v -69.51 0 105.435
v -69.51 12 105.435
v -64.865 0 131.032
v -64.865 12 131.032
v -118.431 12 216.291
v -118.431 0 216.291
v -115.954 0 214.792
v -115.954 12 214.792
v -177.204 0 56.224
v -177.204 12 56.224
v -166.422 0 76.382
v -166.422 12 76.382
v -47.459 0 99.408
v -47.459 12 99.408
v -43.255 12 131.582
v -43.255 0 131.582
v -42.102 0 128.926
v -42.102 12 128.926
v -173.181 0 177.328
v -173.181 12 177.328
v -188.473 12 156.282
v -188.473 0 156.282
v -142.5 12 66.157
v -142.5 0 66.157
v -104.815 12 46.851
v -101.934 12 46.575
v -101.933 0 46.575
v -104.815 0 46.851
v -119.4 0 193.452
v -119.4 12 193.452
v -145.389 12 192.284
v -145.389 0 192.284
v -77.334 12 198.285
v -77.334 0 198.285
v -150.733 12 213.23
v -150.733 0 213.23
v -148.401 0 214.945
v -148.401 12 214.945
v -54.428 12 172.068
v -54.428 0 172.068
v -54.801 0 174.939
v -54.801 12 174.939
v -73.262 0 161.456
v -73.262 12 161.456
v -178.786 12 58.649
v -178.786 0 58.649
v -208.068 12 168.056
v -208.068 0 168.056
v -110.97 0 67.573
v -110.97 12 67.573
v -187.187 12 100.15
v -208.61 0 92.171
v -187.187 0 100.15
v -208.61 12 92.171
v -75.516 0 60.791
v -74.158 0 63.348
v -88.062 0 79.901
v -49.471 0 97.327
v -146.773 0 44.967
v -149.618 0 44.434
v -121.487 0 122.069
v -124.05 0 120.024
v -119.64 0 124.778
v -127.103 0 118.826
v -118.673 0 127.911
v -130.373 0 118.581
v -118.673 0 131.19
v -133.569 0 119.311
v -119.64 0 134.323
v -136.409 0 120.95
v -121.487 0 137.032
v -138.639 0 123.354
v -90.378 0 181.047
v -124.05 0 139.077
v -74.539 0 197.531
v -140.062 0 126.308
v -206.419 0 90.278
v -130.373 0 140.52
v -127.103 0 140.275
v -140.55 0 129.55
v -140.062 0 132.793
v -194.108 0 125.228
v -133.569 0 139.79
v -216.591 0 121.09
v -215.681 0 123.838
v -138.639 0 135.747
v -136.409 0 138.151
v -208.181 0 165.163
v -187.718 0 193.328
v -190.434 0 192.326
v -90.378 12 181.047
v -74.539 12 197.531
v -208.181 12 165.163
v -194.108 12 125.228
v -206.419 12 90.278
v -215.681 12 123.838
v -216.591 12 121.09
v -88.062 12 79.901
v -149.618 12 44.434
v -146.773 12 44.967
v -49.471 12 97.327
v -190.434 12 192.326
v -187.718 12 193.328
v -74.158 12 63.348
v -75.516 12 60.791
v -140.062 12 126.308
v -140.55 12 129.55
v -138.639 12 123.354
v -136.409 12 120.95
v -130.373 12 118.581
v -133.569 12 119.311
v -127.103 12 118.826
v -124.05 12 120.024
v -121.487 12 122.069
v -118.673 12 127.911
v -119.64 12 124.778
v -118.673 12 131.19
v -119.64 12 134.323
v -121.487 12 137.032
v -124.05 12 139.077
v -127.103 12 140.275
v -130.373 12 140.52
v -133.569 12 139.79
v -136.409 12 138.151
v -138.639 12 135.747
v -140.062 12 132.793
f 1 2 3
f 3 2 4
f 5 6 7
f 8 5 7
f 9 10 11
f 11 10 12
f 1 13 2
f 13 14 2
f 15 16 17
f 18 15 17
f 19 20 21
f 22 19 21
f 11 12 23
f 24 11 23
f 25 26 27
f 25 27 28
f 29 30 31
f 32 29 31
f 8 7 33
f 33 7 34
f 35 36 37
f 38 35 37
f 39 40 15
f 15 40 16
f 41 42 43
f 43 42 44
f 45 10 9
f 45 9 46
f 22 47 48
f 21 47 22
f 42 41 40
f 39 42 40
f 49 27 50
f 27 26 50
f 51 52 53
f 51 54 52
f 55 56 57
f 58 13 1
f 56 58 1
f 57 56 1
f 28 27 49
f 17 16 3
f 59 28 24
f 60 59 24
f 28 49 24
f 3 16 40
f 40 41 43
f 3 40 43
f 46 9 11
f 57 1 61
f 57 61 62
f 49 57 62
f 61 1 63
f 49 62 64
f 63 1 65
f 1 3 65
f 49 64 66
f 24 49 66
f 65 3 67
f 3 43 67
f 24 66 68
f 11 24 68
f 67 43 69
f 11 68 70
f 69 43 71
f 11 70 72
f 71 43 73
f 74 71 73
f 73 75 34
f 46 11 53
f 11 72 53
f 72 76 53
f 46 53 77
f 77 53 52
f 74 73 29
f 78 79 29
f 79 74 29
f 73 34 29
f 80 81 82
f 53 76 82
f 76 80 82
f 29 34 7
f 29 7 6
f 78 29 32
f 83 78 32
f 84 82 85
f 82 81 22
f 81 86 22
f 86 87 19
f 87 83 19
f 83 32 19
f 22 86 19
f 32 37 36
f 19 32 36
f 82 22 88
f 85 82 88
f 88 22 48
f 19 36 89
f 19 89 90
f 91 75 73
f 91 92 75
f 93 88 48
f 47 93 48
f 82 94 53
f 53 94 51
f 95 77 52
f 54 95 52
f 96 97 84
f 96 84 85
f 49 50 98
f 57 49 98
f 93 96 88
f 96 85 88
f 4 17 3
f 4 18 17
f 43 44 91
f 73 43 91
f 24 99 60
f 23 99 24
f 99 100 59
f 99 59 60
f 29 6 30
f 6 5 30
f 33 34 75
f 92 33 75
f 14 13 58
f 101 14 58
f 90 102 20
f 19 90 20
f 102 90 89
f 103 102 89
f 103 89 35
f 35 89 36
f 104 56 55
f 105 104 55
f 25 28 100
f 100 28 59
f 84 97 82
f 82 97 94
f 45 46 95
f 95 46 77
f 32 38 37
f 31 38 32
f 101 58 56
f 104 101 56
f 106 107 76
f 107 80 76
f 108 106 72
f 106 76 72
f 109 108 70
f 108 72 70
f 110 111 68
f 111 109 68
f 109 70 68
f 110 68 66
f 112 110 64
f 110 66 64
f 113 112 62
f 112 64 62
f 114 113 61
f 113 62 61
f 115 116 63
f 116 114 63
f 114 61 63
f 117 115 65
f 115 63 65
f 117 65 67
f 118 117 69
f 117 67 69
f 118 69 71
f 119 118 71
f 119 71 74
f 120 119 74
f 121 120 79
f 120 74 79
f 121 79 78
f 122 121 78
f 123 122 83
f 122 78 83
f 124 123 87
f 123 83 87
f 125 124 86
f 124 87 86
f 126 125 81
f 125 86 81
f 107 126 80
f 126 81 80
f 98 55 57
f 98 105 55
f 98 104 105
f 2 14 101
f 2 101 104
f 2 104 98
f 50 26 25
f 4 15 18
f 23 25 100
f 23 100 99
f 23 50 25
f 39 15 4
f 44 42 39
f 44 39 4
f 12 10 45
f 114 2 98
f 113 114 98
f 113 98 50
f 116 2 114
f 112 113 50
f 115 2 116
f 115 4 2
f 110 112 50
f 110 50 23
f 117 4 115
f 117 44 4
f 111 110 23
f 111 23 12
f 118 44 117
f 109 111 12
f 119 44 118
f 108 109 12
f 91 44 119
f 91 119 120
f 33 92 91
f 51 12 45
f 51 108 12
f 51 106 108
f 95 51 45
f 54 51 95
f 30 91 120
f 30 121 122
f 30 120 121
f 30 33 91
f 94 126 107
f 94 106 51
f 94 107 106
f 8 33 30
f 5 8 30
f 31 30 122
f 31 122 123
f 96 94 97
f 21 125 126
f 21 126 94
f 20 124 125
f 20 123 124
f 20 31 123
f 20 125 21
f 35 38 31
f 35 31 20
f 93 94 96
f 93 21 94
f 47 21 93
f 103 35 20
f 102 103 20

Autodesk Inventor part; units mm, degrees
ref_plane "YZ Plane" through (0, 0, 0) normal (1, 0, 0) x (0, 1, 0)
ref_plane "XZ Plane" through (0, 0, 0) normal (0, 1, 0) x (-1, 0, 0)
ref_plane "XY Plane" through (0, 0, 0) normal (0, 0, 1) x (1, 0, 0)
sketch "Sketch2" plane through (0, 0, 0) normal (0, 1, 0) x (-1, 0, 0)
  line L0 (77.8598, 129.5505) -> (181.2412, 129.5505)
  line L1 (129.5505, 77.8598) -> (129.5505, 181.2412)
  line L2 (208.1814, 165.1629) -> (207.9893, 170.0518)
  line L3 (207.9893, 170.0518) -> (209.1581, 174.8028)
  line L4 (209.1581, 174.8028) -> (211.5965, 179.0445)
  line L5 (211.5965, 179.0445) -> (215.1139, 182.4454)
  line L6 (215.1139, 182.4454) -> (217.4859, 184.4007)
  line L7 (217.4859, 184.4007) -> (218.8706, 185.7147)
  line L8 (218.8706, 185.7147) -> (219.868, 187.3423)
  line L9 (219.868, 187.3423) -> (220.4102, 189.1727)
  line L10 (220.4102, 189.1727) -> (220.4602, 191.0809)
  line L11 (220.4602, 191.0809) -> (220.0145, 192.9371)
  line L12 (220.0145, 192.9371) -> (219.1037, 194.6147)
  line L13 (219.1037, 194.6147) -> (217.7897, 195.9994)
  line L14 (217.7897, 195.9994) -> (216.162, 196.9968)
  line L15 (216.162, 196.9968) -> (214.3317, 197.5389)
  line L16 (214.3317, 197.5389) -> (212.4235, 197.5889)
  line L17 (212.4235, 197.5889) -> (210.5673, 197.1433)
  line L18 (210.5673, 197.1433) -> (208.8897, 196.2324)
  line L19 (208.8897, 196.2324) -> (206.2971, 194.5807)
  line L20 (206.2971, 194.5807) -> (201.9757, 192.2864)
  line L21 (201.9757, 192.2864) -> (197.1881, 191.2781)
  line L22 (197.1881, 191.2781) -> (192.3084, 191.6346)
  line L23 (192.3084, 191.6346) -> (187.7182, 193.3281)
  line L24 (187.7182, 193.3281) -> (150.7331, 213.2305)
  line L25 (150.7331, 213.2305) -> (146.7911, 216.1285)
  line L26 (146.7911, 216.1285) -> (143.8054, 220.0046)
  line L27 (143.8054, 220.0046) -> (142.0094, 224.5557)
  line L28 (142.0094, 224.5557) -> (141.5435, 229.4261)
  line L29 (141.5435, 229.4261) -> (141.4937, 232.4997)
  line L30 (141.4937, 232.4997) -> (141.3297, 234.4016)
  line L31 (141.3297, 234.4016) -> (140.6791, 236.1962)
  line L32 (140.6791, 236.1962) -> (139.5861, 237.7613)
  line L33 (139.5861, 237.7613) -> (138.1253, 238.9901)
  line L34 (138.1253, 238.9901) -> (136.3963, 239.799)
  line L35 (136.3963, 239.799) -> (134.5168, 240.1329)
  line L36 (134.5168, 240.1329) -> (132.6149, 239.9689)
  line L37 (132.6149, 239.9689) -> (130.8203, 239.3182)
  line L38 (130.8203, 239.3182) -> (129.2552, 238.2252)
  line L39 (129.2552, 238.2252) -> (128.0264, 236.7645)
  line L40 (128.0264, 236.7645) -> (127.2175, 235.0354)
  line L41 (127.2175, 235.0354) -> (126.8836, 233.1559)
  line L42 (126.8836, 233.1559) -> (126.5586, 230.0991)
  line L43 (126.5586, 230.0991) -> (125.658, 225.29)
  line L44 (125.658, 225.29) -> (123.4612, 220.9182)
  line L45 (123.4612, 220.9182) -> (120.1401, 217.3254)
  line L46 (120.1401, 217.3254) -> (115.9541, 214.7925)
  line L47 (115.9541, 214.7925) -> (77.334, 198.2854)
  line L48 (77.334, 198.2854) -> (72.6104, 197.0103)
  line L49 (72.6104, 197.0103) -> (67.7184, 197.0926)
  line L50 (67.7184, 197.0926) -> (63.0404, 198.526)
  line L51 (63.0404, 198.526) -> (58.9421, 201.1984)
  line L52 (58.9421, 201.1984) -> (56.508, 203.0759)
  line L53 (56.508, 203.0759) -> (54.9188, 204.1335)
  line L54 (54.9188, 204.1335) -> (53.1101, 204.7437)
  line L55 (53.1101, 204.7437) -> (51.205, 204.865)
  line L56 (51.205, 204.865) -> (49.3334, 204.4891)
  line L57 (49.3334, 204.4891) -> (47.623, 203.6416)
  line L58 (47.623, 203.6416) -> (46.1901, 202.3802)
  line L59 (46.1901, 202.3802) -> (45.1326, 200.7911)
  line L60 (45.1326, 200.7911) -> (44.5223, 198.9823)
  line L61 (44.5223, 198.9823) -> (44.401, 197.0772)
  line L62 (44.401, 197.0772) -> (44.777, 195.2057)
  line L63 (44.777, 195.2057) -> (45.6245, 193.4952)
  line L64 (45.6245, 193.4952) -> (46.8858, 192.0624)
  line L65 (46.8858, 192.0624) -> (49.073, 189.9023)
  line L66 (49.073, 189.9023) -> (52.2714, 186.1998)
  line L67 (52.2714, 186.1998) -> (54.3197, 181.7566)
  line L68 (54.3197, 181.7566) -> (55.058, 176.9199)
  line L69 (55.058, 176.9199) -> (54.4284, 172.0679)
  line L70 (54.4284, 172.0679) -> (43.2549, 131.5815)
  line L71 (43.2549, 131.5815) -> (41.3067, 127.0934)
  line L72 (41.3067, 127.0934) -> (38.1923, 123.3201)
  line L73 (38.1923, 123.3201) -> (34.1549, 120.5564)
  line L74 (34.1549, 120.5564) -> (29.5103, 119.0184)
  line L75 (29.5103, 119.0184) -> (26.5248, 118.2859)
  line L76 (26.5248, 118.2859) -> (24.7071, 117.7028)
  line L77 (24.7071, 117.7028) -> (23.1023, 116.6692)
  line L78 (23.1023, 116.6692) -> (21.8196, 115.2553)
  line L79 (21.8196, 115.2553) -> (20.9467, 113.5577)
  line L80 (20.9467, 113.5577) -> (20.5428, 111.692)
  line L81 (20.5428, 111.692) -> (20.6356, 109.7853)
  line L82 (20.6356, 109.7853) -> (21.2187, 107.9677)
  line L83 (21.2187, 107.9677) -> (22.2523, 106.3628)
  line L84 (22.2523, 106.3628) -> (23.6661, 105.0802)
  line L85 (23.6661, 105.0802) -> (25.3638, 104.2072)
  line L86 (25.3638, 104.2072) -> (27.2295, 103.8034)
  line L87 (27.2295, 103.8034) -> (29.1361, 103.8961)
  line L88 (29.1361, 103.8961) -> (32.1886, 104.2594)
  line L89 (32.1886, 104.2594) -> (37.0775, 104.4515)
  line L90 (37.0775, 104.4515) -> (41.8285, 103.2827)
  line L91 (41.8285, 103.2827) -> (46.0703, 100.8443)
  line L92 (46.0703, 100.8443) -> (49.4712, 97.3269)
  line L93 (49.4712, 97.3269) -> (74.1582, 63.3482)
  line L94 (74.1582, 63.3482) -> (76.4524, 59.0268)
  line L95 (76.4524, 59.0268) -> (77.4607, 54.2392)
  line L96 (77.4607, 54.2392) -> (77.1042, 49.3595)
  line L97 (77.1042, 49.3595) -> (75.4108, 44.7692)
  line L98 (75.4108, 44.7692) -> (74.122, 41.9784)
  line L99 (74.122, 41.9784) -> (73.4446, 40.1937)
  line L100 (73.4446, 40.1937) -> (73.2521, 38.2945)
  line L101 (73.2521, 38.2945) -> (73.5578, 36.4102)
  line L102 (73.5578, 36.4102) -> (74.3407, 34.6693)
  line L103 (74.3407, 34.6693) -> (75.5476, 33.1902)
  line L104 (75.5476, 33.1902) -> (77.0961, 32.074)
  line L105 (77.0961, 32.074) -> (78.8808, 31.3966)
  line L106 (78.8808, 31.3966) -> (80.78, 31.2041)
  line L107 (80.78, 31.2041) -> (82.6643, 31.5098)
  line L108 (82.6643, 31.5098) -> (84.4053, 32.2927)
  line L109 (84.4053, 32.2927) -> (85.8843, 33.4996)
  line L110 (85.8843, 33.4996) -> (87.0006, 35.0481)
  line L111 (87.0006, 35.0481) -> (88.6197, 37.6612)
  line L112 (88.6197, 37.6612) -> (91.5177, 41.6033)
  line L113 (91.5177, 41.6033) -> (95.3937, 44.589)
  line L114 (95.3937, 44.589) -> (99.9449, 46.385)
  line L115 (99.9449, 46.385) -> (104.8153, 46.8509)
  line L116 (104.8153, 46.8509) -> (146.773, 44.9666)
  line L117 (146.773, 44.9666) -> (151.582, 44.066)
  line L118 (151.582, 44.066) -> (155.9538, 41.8692)
  line L119 (155.9538, 41.8692) -> (159.5466, 38.5481)
  line L120 (159.5466, 38.5481) -> (162.0796, 34.3621)
  line L121 (162.0796, 34.3621) -> (163.458, 31.6144)
  line L122 (163.458, 31.6144) -> (164.431, 29.9721)
  line L123 (164.431, 29.9721) -> (165.7958, 28.6375)
  line L124 (165.7958, 28.6375) -> (167.4596, 27.7016)
  line L125 (167.4596, 27.7016) -> (169.3089, 27.2283)
  line L126 (169.3089, 27.2283) -> (171.2177, 27.2497)
  line L127 (171.2177, 27.2497) -> (173.0559, 27.7644)
  line L128 (173.0559, 27.7644) -> (174.6983, 28.7374)
  line L129 (174.6983, 28.7374) -> (176.0329, 30.1023)
  line L130 (176.0329, 30.1023) -> (176.9687, 31.766)
  line L131 (176.9687, 31.766) -> (177.4421, 33.6153)
  line L132 (177.4421, 33.6153) -> (177.4207, 35.5241)
  line L133 (177.4207, 35.5241) -> (176.9059, 37.3624)
  line L134 (176.9059, 37.3624) -> (175.8725, 40.2575)
  line L135 (175.8725, 40.2575) -> (174.5974, 44.9811)
  line L136 (174.5974, 44.9811) -> (174.6797, 49.873)
  line L137 (174.6797, 49.873) -> (176.1131, 54.551)
  line L138 (176.1131, 54.551) -> (178.7855, 58.6494)
  line L139 (178.7855, 58.6494) -> (206.4189, 90.2784)
  line L140 (206.4189, 90.2784) -> (210.1214, 93.4767)
  line L141 (210.1214, 93.4767) -> (214.5647, 95.5251)
  line L142 (214.5647, 95.5251) -> (219.4013, 96.2633)
  line L143 (219.4013, 96.2633) -> (224.2533, 95.6338)
  line L144 (224.2533, 95.6338) -> (227.261, 94.9983)
  line L145 (227.261, 94.9983) -> (229.1516, 94.735)
  line L146 (229.1516, 94.735) -> (231.046, 94.97)
  line L147 (231.046, 94.97) -> (232.8151, 95.6873)
  line L148 (232.8151, 95.6873) -> (234.3382, 96.838)
  line L149 (234.3382, 96.838) -> (235.5115, 98.3438)
  line L150 (235.5115, 98.3438) -> (236.2552, 100.1018)
  line L151 (236.2552, 100.1018) -> (236.5185, 101.9925)
  line L152 (236.5185, 101.9925) -> (236.2835, 103.8869)
  line L153 (236.2835, 103.8869) -> (235.5662, 105.656)
  line L154 (235.5662, 105.656) -> (234.4155, 107.1791)
  line L155 (234.4155, 107.1791) -> (232.9098, 108.3524)
  line L156 (232.9098, 108.3524) -> (231.1517, 109.0961)
  line L157 (231.1517, 109.0961) -> (228.2439, 110.0932)
  line L158 (228.2439, 110.0932) -> (223.7558, 112.0414)
  line L159 (223.7558, 112.0414) -> (219.9824, 115.1559)
  line L160 (219.9824, 115.1559) -> (217.2187, 119.1932)
  line L161 (217.2187, 119.1932) -> (215.6807, 123.8378)
  line L162 (215.6807, 123.8378) -> (208.1814, 165.1629)
  circle A0 centre (129.5505, 129.5505) radius 10.75
  dimension "d0" = 21.5
extrude "Extrusion1" add sketch "Sketch2" along normal blind 12
thicken "Thicken1" operation add thickness 0.25 both sides no extend neighbours yes toward (-0.9870503, 0, -0.1604113) faces at (-140.1613, 8, 127.8261)
sketch "Sketch6" plane through (0, 12, 0) normal (0, 1, 0) x (1, 0, 0)
  circle A0 centre (-129.5505, -129.5505) radius 11 projected
  line L0 (-234.4155, -107.1791) -> (-232.9098, -108.3524) construction
  line L1 (-236.2552, -100.1018) -> (-236.5185, -101.9925) construction
  line L2 (-231.046, -94.97) -> (-232.8151, -95.6873) construction
  circle A1 centre (-229.2063, -102.0472) radius 7.2499 construction
  line L3 (-229.2063, -102.0472) -> (-129.5505, -129.5505) construction
  line L4 (-271.7554, -105.8652) -> (-194.6384, -127.1481) construction
  line L5 (-194.6384, -127.1481) -> (-186.6573, -98.2293) construction
  line L6 (-186.6573, -98.2293) -> (-263.7743, -76.9463) construction
  line L7 (-263.7743, -76.9463) -> (-271.7554, -105.8652) construction
  line L8 (-271.7554, -105.8652) -> (-186.6573, -98.2293) construction
  line L9 (-194.6384, -127.1481) -> (-263.7743, -76.9463) construction
  line L10 (-216.5908, -121.0897) -> (-194.1083, -125.2276)
  line L11 (-208.6096, -92.1708) -> (-187.1873, -100.1498)
  line L12 (-206.4189, -90.2784) -> (-210.1214, -93.4767) projected
  line L13 (-217.2187, -119.1932) -> (-215.6807, -123.8378) projected
  line L14 (-194.1083, -125.2276) -> (-187.1873, -100.1498)
  line L15 (-216.5908, -121.0897) -> (-245.6302, -113.0753)
  line L16 (-208.6096, -92.1708) -> (-237.649, -84.1564)
  line L17 (-245.6302, -113.0753) -> (-237.649, -84.1564)
  circle A2 centre (-213.1878, -190.3166) radius 7.2499 construction
  line L18 (-208.0677, -168.0556) -> (-232.4394, -185.7626)
  line L19 (-190.4341, -192.3261) -> (-214.8058, -210.0331)
  line L20 (-189.6439, -154.6699) -> (-254.3653, -201.6927) construction
  line L21 (-236.7317, -225.9632) -> (-189.6439, -154.6699) construction
  line L22 (-172.0104, -178.9404) -> (-254.3653, -201.6927) construction
  line L23 (-236.7317, -225.9632) -> (-172.0104, -178.9404) construction
  line L24 (-214.8058, -210.0331) -> (-232.4394, -185.7626)
  line L25 (-254.3653, -201.6927) -> (-236.7317, -225.9632) construction
  line L26 (-172.0104, -178.9404) -> (-189.6439, -154.6699) construction
  line L27 (-208.0677, -168.0556) -> (-188.4728, -156.2818)
  line L28 (-190.4341, -192.3261) -> (-173.1814, -177.3285)
  line L29 (-173.1814, -177.3285) -> (-188.4728, -156.2818)
  circle A3 centre (-134.1887, -232.8278) radius 7.2499 construction
  line L30 (-148.4007, -214.9452) -> (-149.7522, -245.0399)
  line L31 (-118.4309, -216.2912) -> (-119.7825, -246.3859)
  line L32 (-147.379, -192.1951) -> (-150.9682, -272.1146) construction
  line L33 (-120.9984, -273.4605) -> (-147.379, -192.1951) construction
  line L34 (-117.4092, -193.5411) -> (-150.9682, -272.1146) construction
  line L35 (-120.9984, -273.4605) -> (-117.4092, -193.5411) construction
  line L36 (-119.7825, -246.3859) -> (-149.7522, -245.0399)
  line L37 (-150.9682, -272.1146) -> (-120.9984, -273.4605) construction
  line L38 (-117.4092, -193.5411) -> (-147.379, -192.1951) construction
  line L39 (-148.4007, -214.9452) -> (-145.3886, -192.2845)
  line L40 (-118.4309, -216.2912) -> (-119.3996, -193.4517)
  line L41 (-119.3996, -193.4517) -> (-145.3886, -192.2845)
  circle A4 centre (-51.6969, -197.5691) radius 7.2499 construction
  line L42 (-74.5391, -197.5309) -> (-51.8528, -217.3513)
  line L43 (-54.8009, -174.9388) -> (-32.1146, -194.7592)
  line L44 (-91.6888, -182.5477) -> (-31.4431, -235.1827) construction
  line L45 (-11.705, -212.5906) -> (-91.6888, -182.5477) construction
  line L46 (-71.9507, -159.9555) -> (-31.4431, -235.1827) construction
  line L47 (-11.705, -212.5906) -> (-71.9507, -159.9555) construction
  line L48 (-32.1146, -194.7592) -> (-51.8528, -217.3513)
  line L49 (-31.4431, -235.1827) -> (-11.705, -212.5906) construction
  line L50 (-71.9507, -159.9555) -> (-91.6888, -182.5477) construction
  line L51 (-74.5391, -197.5309) -> (-90.378, -181.0472)
  line L52 (-54.8009, -174.9388) -> (-73.2615, -161.4559)
  line L53 (-73.2615, -161.4559) -> (-90.378, -181.0472)
  circle A5 centre (-27.8305, -111.091) radius 7.2499 construction
  line L54 (-42.1022, -128.926) -> (-12.4613, -123.5469)
  line L55 (-47.4589, -99.4081) -> (-17.818, -94.029)
  line L56 (-64.5093, -132.9922) -> (14.2051, -118.7077) construction
  line L57 (8.8484, -89.1898) -> (-64.5093, -132.9922) construction
  line L58 (-69.866, -103.4744) -> (14.2051, -118.7077) construction
  line L59 (8.8484, -89.1898) -> (-69.866, -103.4744) construction
  line L60 (-17.818, -94.029) -> (-12.4613, -123.5469)
  line L61 (14.2051, -118.7077) -> (8.8484, -89.1898) construction
  line L62 (-69.866, -103.4744) -> (-64.5093, -132.9922) construction
  line L63 (-42.1022, -128.926) -> (-64.865, -131.0319)
  line L64 (-47.4589, -99.4081) -> (-69.5102, -105.4347)
  line L65 (-69.5102, -105.4347) -> (-64.865, -131.0319)
  circle A6 centre (-80.5613, -38.5133) radius 7.2499 construction
  line L66 (-75.5157, -60.7913) -> (-61.2404, -34.2633)
  line L67 (-101.9335, -46.5752) -> (-87.6582, -20.0473)
  line L68 (-86.3071, -80.8451) -> (-48.3976, -10.3975) construction
  line L69 (-74.8155, 3.8186) -> (-86.3071, -80.8451) construction
  line L70 (-112.725, -66.6291) -> (-48.3976, -10.3975) construction
  line L71 (-74.8155, 3.8186) -> (-112.725, -66.6291) construction
  line L72 (-87.6582, -20.0473) -> (-61.2404, -34.2633)
  line L73 (-48.3976, -10.3975) -> (-74.8155, 3.8186) construction
  line L74 (-112.725, -66.6291) -> (-86.3071, -80.8451) construction
  line L75 (-75.5157, -60.7913) -> (-88.0616, -79.901)
  line L76 (-101.9335, -46.5752) -> (-110.9705, -67.5732)
  line L77 (-110.9705, -67.5732) -> (-88.0616, -79.901)
  circle A7 centre (-170.182, -34.4884) radius 7.2499 construction
  line L78 (-149.6184, -44.4337) -> (-161.4583, -16.7329)
  line L79 (-177.2043, -56.2244) -> (-189.0442, -28.5236)
  line L80 (-140.6681, -65.3741) -> (-172.1101, 8.1881) construction
  line L81 (-199.6959, -3.6027) -> (-140.6681, -65.3741) construction
  line L82 (-168.2539, -77.1649) -> (-172.1101, 8.1881) construction
  line L83 (-199.6959, -3.6027) -> (-168.2539, -77.1649) construction
  line L84 (-189.0442, -28.5236) -> (-161.4583, -16.7329)
  line L85 (-172.1101, 8.1881) -> (-199.6959, -3.6027) construction
  line L86 (-168.2539, -77.1649) -> (-140.6681, -65.3741) construction
  line L87 (-149.6184, -44.4337) -> (-142.5001, -66.1572)
  line L88 (-177.2043, -56.2244) -> (-166.4218, -76.3818)
  line L89 (-166.4218, -76.3818) -> (-142.5001, -66.1572)
  point P0 (0, 0)
  dimension "d21" = 30
  dimension "d22" = 40
  dimension "d23" = 85
  dimension "d24" = 85
  dimension "d27" = 360
extrude "Extrusion3" cut sketch "Sketch6" against normal through all contours L15 L17 L16 L11 L14 L10 | L27 L29 L28 L19 L24 L18 | L39 L41 L40 L31 L36 L30 | L51 L53 L52 L43 L48 L42 | L63 L65 L64 L55 L60 L54 | L75 L77 L76 L67 L72 L66 | L87 L89 L88 L79 L84 L78
sketch "Sketch7" plane through (0, 12, 0) normal (0, 1, 0) x (1, 0, 0)
  circle A0 centre (-129.5505, -129.5505) radius 11 projected
  line L0 (-75.5157, -60.7913) -> (-88.0616, -79.901) projected
  line L1 (-88.0616, -79.901) -> (-110.9705, -67.5732) projected
  line L2 (-110.9705, -67.5732) -> (-101.9335, -46.5752) projected
  line L3 (-101.9335, -46.5752) -> (-104.8153, -46.8509) projected
  line L4 (-104.8153, -46.8509) -> (-146.773, -44.9666) projected
  line L5 (-146.773, -44.9666) -> (-149.6184, -44.4337) projected
  line L6 (-149.6184, -44.4337) -> (-142.5001, -66.1572) projected
  line L7 (-142.5001, -66.1572) -> (-166.4218, -76.3818) projected
  line L8 (-166.4218, -76.3818) -> (-177.2043, -56.2244) projected
  line L9 (-177.2043, -56.2244) -> (-178.7855, -58.6494) projected
  line L10 (-178.7855, -58.6494) -> (-206.4189, -90.2784) projected
  line L11 (-206.4189, -90.2784) -> (-208.6096, -92.1708) projected
  line L12 (-208.6096, -92.1708) -> (-187.1873, -100.1498) projected
  line L13 (-187.1873, -100.1498) -> (-194.1083, -125.2276) projected
  line L14 (-194.1083, -125.2276) -> (-216.5908, -121.0897) projected
  line L15 (-216.5908, -121.0897) -> (-215.6807, -123.8378) projected
  line L16 (-215.6807, -123.8378) -> (-208.1814, -165.1629) projected
  line L17 (-208.1814, -165.1629) -> (-208.0677, -168.0556) projected
  line L18 (-208.0677, -168.0556) -> (-188.4728, -156.2818) projected
  line L19 (-188.4728, -156.2818) -> (-173.1814, -177.3285) projected
  line L20 (-173.1814, -177.3285) -> (-190.4341, -192.3261) projected
  line L21 (-190.4341, -192.3261) -> (-187.7182, -193.3281) projected
  line L22 (-187.7182, -193.3281) -> (-150.7331, -213.2305) projected
  line L23 (-150.7331, -213.2305) -> (-148.4007, -214.9452) projected
  line L24 (-148.4007, -214.9452) -> (-145.3886, -192.2845) projected
  line L25 (-145.3886, -192.2845) -> (-119.3996, -193.4517) projected
  line L26 (-119.3996, -193.4517) -> (-118.4309, -216.2912) projected
  line L27 (-118.4309, -216.2912) -> (-115.9541, -214.7925) projected
  line L28 (-115.9541, -214.7925) -> (-77.334, -198.2854) projected
  line L29 (-77.334, -198.2854) -> (-74.5391, -197.5309) projected
  line L30 (-74.5391, -197.5309) -> (-90.378, -181.0472) projected
  line L31 (-90.378, -181.0472) -> (-73.2615, -161.4559) projected
  line L32 (-73.2615, -161.4559) -> (-54.8009, -174.9388) projected
  line L33 (-54.8009, -174.9388) -> (-54.4284, -172.0679) projected
  line L34 (-54.4284, -172.0679) -> (-43.2549, -131.5815) projected
  line L35 (-43.2549, -131.5815) -> (-42.1022, -128.926) projected
  line L36 (-42.1022, -128.926) -> (-64.865, -131.0319) projected
  line L37 (-64.865, -131.0319) -> (-69.5102, -105.4347) projected
  line L38 (-69.5102, -105.4347) -> (-47.4589, -99.4081) projected
  line L39 (-47.4589, -99.4081) -> (-49.4712, -97.3269) projected
  line L40 (-49.4712, -97.3269) -> (-74.1582, -63.3482) projected
  line L41 (-74.1582, -63.3482) -> (-75.5157, -60.7913) projected
  point P0 (0, 0)
equation "\"d24\" = d23"
properties part number "sprocket7_mk2"
